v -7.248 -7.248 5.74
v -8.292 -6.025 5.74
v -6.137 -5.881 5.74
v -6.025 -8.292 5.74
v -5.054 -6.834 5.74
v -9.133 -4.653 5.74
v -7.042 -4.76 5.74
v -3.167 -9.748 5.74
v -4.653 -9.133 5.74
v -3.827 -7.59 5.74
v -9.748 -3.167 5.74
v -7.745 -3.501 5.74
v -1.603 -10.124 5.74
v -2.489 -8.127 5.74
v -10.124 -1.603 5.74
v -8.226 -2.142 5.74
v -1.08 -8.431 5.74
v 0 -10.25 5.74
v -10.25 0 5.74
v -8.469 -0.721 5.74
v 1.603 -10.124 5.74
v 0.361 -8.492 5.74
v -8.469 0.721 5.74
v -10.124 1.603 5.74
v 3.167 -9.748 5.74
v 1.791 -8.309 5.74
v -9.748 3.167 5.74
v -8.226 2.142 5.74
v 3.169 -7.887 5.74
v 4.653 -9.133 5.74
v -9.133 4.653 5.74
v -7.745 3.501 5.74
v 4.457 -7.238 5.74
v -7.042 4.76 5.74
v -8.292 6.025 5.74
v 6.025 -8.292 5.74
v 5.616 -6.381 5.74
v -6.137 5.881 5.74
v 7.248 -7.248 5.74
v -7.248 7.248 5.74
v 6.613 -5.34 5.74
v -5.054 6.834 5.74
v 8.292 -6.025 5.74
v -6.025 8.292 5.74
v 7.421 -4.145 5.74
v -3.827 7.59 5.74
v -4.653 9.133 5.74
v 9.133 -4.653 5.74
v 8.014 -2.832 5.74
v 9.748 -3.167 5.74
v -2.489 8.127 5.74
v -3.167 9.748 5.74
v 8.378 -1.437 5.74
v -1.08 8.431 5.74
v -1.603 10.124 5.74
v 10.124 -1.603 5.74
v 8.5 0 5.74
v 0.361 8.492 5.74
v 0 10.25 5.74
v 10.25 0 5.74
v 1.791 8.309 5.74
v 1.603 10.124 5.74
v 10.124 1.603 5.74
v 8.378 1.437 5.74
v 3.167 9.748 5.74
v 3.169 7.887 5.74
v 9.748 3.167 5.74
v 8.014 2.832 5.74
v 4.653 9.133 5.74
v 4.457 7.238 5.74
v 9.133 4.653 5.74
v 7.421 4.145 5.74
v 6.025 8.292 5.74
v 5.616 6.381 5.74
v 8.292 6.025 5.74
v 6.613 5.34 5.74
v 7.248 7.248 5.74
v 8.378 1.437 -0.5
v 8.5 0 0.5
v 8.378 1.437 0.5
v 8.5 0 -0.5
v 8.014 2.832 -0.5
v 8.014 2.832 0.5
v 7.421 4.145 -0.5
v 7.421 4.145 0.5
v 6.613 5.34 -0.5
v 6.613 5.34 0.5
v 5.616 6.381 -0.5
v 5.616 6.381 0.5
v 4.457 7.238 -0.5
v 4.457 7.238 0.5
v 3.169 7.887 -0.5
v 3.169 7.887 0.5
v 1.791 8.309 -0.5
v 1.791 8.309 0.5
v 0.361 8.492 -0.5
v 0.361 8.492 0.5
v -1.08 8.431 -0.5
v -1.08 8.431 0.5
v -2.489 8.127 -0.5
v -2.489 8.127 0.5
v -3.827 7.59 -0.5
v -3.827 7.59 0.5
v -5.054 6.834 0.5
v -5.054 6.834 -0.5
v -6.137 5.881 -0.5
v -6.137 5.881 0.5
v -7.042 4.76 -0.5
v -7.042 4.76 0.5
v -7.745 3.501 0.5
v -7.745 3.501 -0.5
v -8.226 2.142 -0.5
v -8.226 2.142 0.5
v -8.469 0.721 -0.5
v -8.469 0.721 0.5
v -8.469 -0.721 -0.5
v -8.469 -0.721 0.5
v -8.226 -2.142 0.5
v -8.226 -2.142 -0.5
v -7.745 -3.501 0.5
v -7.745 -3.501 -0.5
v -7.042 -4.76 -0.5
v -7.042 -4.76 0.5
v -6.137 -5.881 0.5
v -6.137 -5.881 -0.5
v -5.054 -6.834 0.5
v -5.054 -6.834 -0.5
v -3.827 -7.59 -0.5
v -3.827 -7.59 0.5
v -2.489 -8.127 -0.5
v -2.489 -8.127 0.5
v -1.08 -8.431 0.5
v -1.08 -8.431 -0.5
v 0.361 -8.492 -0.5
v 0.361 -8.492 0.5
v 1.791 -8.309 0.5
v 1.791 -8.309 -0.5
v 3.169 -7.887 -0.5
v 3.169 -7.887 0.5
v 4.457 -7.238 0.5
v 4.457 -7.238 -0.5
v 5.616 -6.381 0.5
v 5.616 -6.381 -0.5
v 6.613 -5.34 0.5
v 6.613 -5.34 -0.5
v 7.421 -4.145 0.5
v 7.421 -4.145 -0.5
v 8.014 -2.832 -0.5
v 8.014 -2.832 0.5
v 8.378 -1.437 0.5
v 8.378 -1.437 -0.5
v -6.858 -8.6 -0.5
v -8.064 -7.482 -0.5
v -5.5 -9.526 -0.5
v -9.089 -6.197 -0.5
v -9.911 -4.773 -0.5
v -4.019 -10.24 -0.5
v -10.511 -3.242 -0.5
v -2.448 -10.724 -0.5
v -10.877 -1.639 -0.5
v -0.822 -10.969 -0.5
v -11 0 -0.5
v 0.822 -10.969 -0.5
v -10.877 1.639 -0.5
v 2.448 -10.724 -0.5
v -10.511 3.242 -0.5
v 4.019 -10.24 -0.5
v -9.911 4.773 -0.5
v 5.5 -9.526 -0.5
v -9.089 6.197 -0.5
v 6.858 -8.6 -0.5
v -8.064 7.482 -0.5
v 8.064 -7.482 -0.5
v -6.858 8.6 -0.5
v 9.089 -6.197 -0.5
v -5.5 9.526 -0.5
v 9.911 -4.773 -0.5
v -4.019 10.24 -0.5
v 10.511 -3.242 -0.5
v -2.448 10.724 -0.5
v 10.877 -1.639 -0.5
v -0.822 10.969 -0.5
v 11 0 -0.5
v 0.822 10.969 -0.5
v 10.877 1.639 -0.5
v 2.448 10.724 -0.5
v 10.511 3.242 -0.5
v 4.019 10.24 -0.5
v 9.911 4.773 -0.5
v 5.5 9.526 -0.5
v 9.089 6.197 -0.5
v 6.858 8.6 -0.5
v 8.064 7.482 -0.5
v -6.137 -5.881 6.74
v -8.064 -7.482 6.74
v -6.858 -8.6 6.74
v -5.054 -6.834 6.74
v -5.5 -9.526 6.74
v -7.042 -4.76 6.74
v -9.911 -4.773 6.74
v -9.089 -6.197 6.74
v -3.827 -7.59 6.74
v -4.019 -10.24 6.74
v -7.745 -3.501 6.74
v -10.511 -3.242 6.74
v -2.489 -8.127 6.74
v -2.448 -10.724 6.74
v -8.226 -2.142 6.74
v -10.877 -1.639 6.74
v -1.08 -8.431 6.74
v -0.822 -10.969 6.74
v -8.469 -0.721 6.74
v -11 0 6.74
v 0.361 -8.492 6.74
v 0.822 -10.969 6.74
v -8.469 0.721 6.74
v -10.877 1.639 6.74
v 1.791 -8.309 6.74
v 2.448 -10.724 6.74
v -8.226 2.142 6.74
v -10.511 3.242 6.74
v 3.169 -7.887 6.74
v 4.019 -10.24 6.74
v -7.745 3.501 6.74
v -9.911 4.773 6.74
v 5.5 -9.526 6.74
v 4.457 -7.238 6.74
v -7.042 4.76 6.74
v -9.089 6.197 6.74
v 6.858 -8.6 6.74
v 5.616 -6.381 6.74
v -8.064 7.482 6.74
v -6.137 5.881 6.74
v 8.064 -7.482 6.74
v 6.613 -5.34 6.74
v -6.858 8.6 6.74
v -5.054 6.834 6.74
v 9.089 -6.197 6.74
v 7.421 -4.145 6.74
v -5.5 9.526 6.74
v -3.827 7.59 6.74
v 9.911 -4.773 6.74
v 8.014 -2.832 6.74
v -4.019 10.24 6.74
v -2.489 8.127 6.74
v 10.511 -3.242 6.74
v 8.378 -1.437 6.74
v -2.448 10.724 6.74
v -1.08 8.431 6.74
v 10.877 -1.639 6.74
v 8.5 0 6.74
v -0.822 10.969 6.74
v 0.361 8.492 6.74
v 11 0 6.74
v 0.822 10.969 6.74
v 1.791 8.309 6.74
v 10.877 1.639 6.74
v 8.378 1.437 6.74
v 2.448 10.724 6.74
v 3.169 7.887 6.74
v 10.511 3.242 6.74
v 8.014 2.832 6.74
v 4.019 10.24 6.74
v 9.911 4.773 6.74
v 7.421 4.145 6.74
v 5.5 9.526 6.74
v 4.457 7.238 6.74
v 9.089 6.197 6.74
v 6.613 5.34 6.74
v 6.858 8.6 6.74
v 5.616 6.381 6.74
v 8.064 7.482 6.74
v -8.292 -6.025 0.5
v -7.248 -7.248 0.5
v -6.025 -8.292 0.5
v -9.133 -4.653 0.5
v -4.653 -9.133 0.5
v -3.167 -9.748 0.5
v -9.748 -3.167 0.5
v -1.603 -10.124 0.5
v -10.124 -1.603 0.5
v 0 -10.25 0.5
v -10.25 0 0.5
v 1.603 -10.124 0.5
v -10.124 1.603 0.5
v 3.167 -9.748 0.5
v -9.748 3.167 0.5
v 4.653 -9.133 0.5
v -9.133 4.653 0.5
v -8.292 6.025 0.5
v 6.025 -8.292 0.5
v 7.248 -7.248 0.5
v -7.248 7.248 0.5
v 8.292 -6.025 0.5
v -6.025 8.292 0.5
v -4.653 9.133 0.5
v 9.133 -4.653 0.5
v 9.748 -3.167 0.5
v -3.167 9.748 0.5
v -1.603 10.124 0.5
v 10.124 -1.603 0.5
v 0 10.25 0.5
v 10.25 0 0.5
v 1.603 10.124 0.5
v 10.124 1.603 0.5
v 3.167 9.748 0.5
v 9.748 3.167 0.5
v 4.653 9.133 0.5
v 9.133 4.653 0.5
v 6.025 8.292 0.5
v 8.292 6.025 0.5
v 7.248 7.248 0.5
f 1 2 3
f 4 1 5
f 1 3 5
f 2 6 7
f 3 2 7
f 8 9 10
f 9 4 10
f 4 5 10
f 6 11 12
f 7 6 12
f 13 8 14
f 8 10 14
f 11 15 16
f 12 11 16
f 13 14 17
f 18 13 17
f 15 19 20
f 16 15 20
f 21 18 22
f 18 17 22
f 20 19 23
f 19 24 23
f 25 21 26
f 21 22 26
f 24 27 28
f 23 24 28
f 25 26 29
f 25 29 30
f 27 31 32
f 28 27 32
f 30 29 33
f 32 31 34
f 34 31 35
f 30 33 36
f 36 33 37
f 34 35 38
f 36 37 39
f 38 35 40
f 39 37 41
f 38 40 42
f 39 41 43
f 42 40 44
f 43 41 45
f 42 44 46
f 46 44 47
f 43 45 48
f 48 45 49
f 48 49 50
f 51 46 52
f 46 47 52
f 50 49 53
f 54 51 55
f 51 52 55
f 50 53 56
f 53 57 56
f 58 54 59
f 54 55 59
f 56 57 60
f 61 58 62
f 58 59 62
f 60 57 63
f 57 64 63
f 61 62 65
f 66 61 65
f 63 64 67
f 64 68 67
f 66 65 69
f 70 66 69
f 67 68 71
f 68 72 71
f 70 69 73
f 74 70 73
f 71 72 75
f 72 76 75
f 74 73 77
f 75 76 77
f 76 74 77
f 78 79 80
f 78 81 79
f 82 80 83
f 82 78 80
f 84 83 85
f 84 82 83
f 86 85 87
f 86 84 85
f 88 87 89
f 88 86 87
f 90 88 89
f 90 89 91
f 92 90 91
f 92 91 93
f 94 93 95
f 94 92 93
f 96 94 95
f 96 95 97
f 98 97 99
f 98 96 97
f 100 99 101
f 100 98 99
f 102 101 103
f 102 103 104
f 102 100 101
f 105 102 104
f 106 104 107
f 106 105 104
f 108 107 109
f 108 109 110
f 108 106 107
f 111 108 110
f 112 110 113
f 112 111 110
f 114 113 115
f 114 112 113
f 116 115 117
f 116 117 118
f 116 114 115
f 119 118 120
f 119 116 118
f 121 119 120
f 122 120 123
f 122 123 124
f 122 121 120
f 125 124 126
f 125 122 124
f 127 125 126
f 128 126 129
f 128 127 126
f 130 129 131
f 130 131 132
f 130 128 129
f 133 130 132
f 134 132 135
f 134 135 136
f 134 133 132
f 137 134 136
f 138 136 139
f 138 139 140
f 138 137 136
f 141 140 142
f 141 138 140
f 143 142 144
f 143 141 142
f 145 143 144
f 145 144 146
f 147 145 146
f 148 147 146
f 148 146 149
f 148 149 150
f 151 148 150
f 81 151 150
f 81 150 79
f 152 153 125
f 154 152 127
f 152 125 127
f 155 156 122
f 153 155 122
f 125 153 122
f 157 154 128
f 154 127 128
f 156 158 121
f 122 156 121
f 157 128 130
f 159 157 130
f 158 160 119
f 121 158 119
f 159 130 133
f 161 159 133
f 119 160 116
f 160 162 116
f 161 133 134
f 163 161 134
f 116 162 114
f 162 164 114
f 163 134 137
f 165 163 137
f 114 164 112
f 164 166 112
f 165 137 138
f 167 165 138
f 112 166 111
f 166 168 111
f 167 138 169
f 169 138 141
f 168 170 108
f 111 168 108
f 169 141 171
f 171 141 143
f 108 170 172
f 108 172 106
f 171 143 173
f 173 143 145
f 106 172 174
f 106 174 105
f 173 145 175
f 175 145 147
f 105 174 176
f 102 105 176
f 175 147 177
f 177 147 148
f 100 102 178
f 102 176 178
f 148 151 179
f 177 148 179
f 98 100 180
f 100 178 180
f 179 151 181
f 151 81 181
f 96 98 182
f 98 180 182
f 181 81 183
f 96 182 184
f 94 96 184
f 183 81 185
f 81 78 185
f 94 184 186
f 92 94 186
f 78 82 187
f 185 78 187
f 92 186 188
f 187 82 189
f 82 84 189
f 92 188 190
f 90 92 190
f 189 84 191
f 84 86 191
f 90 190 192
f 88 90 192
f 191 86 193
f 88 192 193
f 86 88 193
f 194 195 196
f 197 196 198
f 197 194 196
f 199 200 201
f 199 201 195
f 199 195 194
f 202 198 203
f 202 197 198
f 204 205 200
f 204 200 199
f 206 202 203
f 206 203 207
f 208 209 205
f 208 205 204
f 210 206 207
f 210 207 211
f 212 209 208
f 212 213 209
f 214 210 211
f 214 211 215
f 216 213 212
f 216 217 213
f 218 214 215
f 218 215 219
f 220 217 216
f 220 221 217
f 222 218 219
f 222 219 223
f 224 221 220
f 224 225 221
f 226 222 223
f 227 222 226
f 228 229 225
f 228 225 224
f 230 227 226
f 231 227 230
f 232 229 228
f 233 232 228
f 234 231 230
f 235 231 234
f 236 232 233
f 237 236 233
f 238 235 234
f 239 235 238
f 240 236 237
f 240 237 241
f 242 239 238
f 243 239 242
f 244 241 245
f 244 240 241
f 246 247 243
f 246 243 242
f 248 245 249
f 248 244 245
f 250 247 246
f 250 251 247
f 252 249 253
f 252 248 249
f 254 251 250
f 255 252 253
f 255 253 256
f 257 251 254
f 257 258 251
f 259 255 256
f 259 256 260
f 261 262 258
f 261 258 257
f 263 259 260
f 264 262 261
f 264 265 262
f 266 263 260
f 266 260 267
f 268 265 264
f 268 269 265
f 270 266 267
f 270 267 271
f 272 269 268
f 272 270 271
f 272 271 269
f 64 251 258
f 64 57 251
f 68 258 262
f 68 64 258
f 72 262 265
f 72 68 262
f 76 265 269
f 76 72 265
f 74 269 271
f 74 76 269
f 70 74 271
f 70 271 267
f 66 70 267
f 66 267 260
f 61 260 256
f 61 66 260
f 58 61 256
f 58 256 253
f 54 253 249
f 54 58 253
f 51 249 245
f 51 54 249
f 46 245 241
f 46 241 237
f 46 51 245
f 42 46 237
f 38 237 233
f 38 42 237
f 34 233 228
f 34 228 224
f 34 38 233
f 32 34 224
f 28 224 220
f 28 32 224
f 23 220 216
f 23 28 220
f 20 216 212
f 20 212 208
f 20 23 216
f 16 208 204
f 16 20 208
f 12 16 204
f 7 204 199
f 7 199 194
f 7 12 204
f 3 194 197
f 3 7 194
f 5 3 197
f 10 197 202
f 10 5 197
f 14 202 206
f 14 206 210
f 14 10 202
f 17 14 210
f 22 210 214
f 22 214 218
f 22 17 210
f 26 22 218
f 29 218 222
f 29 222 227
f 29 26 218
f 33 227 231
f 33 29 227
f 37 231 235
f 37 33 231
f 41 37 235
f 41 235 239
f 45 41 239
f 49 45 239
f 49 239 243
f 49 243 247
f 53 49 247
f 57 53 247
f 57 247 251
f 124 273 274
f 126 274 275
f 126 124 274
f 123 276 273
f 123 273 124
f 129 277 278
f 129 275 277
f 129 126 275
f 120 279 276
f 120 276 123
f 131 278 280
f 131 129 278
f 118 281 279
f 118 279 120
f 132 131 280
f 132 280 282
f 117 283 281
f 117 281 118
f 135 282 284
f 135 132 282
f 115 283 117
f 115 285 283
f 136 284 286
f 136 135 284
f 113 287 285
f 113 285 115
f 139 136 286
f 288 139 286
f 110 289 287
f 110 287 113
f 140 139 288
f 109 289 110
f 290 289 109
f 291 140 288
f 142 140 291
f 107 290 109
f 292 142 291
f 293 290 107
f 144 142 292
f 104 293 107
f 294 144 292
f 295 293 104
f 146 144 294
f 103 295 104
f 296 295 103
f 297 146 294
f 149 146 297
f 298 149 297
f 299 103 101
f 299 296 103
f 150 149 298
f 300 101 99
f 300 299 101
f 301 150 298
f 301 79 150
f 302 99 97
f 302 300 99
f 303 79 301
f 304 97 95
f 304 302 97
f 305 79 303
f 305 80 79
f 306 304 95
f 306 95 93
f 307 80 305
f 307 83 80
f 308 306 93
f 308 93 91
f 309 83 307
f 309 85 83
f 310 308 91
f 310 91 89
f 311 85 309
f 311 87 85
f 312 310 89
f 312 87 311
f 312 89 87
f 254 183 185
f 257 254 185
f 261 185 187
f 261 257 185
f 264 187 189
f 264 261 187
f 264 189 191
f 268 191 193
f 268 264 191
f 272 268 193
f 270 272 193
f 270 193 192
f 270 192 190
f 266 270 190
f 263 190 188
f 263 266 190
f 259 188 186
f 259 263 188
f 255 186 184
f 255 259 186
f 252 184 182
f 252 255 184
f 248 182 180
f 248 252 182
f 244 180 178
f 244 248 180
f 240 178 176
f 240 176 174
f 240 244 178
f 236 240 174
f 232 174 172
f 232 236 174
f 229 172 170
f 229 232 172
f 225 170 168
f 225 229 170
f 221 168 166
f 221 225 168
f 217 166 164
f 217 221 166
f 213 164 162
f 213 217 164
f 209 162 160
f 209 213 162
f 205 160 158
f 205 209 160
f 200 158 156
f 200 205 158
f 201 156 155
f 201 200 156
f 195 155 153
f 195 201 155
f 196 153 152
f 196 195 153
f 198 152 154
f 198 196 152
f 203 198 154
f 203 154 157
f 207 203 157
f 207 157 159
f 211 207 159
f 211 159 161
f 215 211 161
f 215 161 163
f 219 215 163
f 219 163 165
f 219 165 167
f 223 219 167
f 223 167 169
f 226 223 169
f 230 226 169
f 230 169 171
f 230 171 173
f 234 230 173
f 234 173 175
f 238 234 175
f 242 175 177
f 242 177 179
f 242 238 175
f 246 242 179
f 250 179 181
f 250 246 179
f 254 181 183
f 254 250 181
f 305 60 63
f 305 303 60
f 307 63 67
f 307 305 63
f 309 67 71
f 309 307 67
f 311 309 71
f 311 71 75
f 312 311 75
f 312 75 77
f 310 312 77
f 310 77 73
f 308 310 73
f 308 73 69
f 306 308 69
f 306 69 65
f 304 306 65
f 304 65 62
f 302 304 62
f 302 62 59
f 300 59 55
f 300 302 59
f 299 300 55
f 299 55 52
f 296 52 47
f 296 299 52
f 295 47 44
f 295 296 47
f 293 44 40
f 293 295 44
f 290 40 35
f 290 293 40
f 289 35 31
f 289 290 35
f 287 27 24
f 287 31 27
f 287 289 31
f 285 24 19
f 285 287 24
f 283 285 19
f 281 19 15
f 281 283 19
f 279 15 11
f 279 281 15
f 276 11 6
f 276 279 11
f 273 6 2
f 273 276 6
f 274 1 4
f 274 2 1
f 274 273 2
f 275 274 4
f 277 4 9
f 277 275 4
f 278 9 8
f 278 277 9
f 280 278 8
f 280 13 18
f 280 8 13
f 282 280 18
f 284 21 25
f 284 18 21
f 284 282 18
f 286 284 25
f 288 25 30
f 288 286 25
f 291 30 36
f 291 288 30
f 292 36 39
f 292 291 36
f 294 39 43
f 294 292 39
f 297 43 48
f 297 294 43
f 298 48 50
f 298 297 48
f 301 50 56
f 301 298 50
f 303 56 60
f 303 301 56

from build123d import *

# Parameters (mm, degrees)
F2_R     = 11
F2_R_2   = 8.5
F4_DEPTH = 0.5
F0_R     = 11
F0_R_2   = 8.5
F5_R     = 11
F5_R_2   = 10.25
F6_DEPTH = 2.6364565


with BuildPart() as f4:
    # F2 (on offset) → F4 (new body, symmetric)
    with BuildSketch(Plane.XY.offset(6.24)):
        Circle(F2_R)
        Circle(F2_R_2, mode=Mode.SUBTRACT)
    extrude(amount=F4_DEPTH, both=True)



with BuildPart() as f4b:
    # F0 (on Top) → F4, piece 2 (new body, symmetric)
    with BuildSketch(Plane.XY):
        Circle(F0_R)
        Circle(F0_R_2, mode=Mode.SUBTRACT)
    extrude(amount=F4_DEPTH, both=True)


with BuildPart() as f4_1:
    add(f4.part)

    add(f4b.part)  # F6 merges F4b
    # F5 (on offset) → F6 (join, symmetric)
    with BuildSketch(Plane.XY.offset(3.1183971)):
        Circle(F5_R)
        Circle(F5_R_2, mode=Mode.SUBTRACT)
    extrude(amount=F6_DEPTH, both=True)


solid = f4_1.part
